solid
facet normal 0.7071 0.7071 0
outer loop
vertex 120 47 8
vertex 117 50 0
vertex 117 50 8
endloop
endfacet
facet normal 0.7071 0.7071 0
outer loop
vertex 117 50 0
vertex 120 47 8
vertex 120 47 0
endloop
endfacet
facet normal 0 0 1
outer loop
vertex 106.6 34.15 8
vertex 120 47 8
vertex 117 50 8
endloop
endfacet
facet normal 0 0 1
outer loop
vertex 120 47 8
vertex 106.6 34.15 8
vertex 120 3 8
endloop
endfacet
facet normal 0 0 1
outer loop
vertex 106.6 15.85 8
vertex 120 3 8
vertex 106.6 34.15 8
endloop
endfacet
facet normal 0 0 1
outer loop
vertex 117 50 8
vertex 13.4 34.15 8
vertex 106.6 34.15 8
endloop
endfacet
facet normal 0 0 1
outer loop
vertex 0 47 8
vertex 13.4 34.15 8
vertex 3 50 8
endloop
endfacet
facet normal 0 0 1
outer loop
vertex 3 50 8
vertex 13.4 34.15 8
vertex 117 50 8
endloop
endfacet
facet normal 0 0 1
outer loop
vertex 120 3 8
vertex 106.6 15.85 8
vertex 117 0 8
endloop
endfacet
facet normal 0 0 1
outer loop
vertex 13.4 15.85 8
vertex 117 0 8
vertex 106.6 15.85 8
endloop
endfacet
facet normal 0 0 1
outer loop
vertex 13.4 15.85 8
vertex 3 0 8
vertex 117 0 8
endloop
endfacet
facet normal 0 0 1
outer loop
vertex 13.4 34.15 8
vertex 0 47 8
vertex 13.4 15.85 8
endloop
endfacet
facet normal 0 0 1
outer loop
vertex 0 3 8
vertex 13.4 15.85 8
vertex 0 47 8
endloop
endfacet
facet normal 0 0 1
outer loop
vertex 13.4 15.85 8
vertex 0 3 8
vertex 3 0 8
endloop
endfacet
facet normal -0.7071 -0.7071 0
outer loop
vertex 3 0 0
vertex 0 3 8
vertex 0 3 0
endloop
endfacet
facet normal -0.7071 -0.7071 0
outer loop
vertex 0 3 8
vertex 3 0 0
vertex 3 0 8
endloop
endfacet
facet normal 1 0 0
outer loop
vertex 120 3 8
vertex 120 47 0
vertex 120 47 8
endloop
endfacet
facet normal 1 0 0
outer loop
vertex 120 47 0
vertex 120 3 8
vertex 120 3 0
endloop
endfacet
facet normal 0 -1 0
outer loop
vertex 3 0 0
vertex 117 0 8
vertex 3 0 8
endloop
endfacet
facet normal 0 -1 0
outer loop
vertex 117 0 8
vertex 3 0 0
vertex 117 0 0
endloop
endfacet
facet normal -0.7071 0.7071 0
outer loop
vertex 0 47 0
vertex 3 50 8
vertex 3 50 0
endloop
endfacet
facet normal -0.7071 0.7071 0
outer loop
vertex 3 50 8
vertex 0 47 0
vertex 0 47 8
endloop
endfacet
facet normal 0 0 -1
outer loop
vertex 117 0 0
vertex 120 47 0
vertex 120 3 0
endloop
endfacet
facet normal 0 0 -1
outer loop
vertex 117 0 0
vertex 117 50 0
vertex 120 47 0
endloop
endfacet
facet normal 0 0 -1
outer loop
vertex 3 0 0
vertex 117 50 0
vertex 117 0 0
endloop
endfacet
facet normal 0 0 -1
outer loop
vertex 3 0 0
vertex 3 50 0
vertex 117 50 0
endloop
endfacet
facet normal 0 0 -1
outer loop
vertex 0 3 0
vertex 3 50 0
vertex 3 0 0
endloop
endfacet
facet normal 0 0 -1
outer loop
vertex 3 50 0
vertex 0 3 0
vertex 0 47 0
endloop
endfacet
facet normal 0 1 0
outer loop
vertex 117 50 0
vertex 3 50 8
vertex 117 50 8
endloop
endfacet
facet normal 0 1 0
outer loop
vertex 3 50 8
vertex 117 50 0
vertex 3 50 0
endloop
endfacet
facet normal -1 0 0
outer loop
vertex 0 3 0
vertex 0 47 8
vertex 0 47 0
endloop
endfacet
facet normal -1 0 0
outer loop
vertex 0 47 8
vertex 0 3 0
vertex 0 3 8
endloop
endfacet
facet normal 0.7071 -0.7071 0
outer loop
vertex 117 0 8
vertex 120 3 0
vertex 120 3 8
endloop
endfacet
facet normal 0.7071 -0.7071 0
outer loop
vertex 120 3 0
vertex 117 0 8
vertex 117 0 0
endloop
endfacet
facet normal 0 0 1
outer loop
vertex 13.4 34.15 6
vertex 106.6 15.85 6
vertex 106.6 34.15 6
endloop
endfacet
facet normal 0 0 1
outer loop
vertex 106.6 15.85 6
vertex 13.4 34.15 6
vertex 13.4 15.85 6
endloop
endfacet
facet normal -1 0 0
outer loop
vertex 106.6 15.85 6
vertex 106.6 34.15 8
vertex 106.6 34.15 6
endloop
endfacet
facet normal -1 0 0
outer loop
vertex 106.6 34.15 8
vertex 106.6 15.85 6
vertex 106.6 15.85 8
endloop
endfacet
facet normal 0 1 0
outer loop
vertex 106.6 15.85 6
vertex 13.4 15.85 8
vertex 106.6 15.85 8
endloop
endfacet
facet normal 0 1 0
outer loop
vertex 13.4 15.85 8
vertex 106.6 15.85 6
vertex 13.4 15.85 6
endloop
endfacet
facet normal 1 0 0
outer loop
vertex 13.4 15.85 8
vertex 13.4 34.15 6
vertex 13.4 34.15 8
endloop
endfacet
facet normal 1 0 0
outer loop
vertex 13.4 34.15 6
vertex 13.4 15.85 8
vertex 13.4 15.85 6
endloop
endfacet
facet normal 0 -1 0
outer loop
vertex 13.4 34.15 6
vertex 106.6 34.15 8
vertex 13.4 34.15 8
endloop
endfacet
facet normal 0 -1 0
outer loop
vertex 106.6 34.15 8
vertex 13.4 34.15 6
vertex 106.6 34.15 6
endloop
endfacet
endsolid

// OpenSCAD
$fn = 32;

// ----------------------------------------------------------------------
// Windowed plate: 1 voids, 120 x 50 x 8 mm
// ----------------------------------------------------------------------

// --- parameters (mm) ---
plate_l = 120;            // plate length, X
plate_w = 50;             // plate width, Y
plate_t = 8;              // plate thickness, Z
edge_margin = 10;         // wall from the plate edge to any window
win1_l = 93.2;            // window length
win1_w = 18.3;            // window width
depth_1 = 2;              // depth of void 1 (full thickness = through)
corner_c = 3;             // corner chamfer of the plate

profile = [[3, 0], [117, 0], [120, 3], [120, 47], [117, 50], [3, 50], [0, 47], [0, 3]];  // primary outline, 8 points, counter clockwise
void_1 = [[13.4, 15.85], [106.6, 15.85], [106.6, 34.15], [13.4, 34.15]];  // large central window, 4 points

// --- the one profile operation ---
difference() {
  linear_extrude(height = plate_t) polygon(points = profile);
  translate([0, 0, plate_t - depth_1])
    linear_extrude(height = depth_1 + 1) polygon(points = void_1);
}
